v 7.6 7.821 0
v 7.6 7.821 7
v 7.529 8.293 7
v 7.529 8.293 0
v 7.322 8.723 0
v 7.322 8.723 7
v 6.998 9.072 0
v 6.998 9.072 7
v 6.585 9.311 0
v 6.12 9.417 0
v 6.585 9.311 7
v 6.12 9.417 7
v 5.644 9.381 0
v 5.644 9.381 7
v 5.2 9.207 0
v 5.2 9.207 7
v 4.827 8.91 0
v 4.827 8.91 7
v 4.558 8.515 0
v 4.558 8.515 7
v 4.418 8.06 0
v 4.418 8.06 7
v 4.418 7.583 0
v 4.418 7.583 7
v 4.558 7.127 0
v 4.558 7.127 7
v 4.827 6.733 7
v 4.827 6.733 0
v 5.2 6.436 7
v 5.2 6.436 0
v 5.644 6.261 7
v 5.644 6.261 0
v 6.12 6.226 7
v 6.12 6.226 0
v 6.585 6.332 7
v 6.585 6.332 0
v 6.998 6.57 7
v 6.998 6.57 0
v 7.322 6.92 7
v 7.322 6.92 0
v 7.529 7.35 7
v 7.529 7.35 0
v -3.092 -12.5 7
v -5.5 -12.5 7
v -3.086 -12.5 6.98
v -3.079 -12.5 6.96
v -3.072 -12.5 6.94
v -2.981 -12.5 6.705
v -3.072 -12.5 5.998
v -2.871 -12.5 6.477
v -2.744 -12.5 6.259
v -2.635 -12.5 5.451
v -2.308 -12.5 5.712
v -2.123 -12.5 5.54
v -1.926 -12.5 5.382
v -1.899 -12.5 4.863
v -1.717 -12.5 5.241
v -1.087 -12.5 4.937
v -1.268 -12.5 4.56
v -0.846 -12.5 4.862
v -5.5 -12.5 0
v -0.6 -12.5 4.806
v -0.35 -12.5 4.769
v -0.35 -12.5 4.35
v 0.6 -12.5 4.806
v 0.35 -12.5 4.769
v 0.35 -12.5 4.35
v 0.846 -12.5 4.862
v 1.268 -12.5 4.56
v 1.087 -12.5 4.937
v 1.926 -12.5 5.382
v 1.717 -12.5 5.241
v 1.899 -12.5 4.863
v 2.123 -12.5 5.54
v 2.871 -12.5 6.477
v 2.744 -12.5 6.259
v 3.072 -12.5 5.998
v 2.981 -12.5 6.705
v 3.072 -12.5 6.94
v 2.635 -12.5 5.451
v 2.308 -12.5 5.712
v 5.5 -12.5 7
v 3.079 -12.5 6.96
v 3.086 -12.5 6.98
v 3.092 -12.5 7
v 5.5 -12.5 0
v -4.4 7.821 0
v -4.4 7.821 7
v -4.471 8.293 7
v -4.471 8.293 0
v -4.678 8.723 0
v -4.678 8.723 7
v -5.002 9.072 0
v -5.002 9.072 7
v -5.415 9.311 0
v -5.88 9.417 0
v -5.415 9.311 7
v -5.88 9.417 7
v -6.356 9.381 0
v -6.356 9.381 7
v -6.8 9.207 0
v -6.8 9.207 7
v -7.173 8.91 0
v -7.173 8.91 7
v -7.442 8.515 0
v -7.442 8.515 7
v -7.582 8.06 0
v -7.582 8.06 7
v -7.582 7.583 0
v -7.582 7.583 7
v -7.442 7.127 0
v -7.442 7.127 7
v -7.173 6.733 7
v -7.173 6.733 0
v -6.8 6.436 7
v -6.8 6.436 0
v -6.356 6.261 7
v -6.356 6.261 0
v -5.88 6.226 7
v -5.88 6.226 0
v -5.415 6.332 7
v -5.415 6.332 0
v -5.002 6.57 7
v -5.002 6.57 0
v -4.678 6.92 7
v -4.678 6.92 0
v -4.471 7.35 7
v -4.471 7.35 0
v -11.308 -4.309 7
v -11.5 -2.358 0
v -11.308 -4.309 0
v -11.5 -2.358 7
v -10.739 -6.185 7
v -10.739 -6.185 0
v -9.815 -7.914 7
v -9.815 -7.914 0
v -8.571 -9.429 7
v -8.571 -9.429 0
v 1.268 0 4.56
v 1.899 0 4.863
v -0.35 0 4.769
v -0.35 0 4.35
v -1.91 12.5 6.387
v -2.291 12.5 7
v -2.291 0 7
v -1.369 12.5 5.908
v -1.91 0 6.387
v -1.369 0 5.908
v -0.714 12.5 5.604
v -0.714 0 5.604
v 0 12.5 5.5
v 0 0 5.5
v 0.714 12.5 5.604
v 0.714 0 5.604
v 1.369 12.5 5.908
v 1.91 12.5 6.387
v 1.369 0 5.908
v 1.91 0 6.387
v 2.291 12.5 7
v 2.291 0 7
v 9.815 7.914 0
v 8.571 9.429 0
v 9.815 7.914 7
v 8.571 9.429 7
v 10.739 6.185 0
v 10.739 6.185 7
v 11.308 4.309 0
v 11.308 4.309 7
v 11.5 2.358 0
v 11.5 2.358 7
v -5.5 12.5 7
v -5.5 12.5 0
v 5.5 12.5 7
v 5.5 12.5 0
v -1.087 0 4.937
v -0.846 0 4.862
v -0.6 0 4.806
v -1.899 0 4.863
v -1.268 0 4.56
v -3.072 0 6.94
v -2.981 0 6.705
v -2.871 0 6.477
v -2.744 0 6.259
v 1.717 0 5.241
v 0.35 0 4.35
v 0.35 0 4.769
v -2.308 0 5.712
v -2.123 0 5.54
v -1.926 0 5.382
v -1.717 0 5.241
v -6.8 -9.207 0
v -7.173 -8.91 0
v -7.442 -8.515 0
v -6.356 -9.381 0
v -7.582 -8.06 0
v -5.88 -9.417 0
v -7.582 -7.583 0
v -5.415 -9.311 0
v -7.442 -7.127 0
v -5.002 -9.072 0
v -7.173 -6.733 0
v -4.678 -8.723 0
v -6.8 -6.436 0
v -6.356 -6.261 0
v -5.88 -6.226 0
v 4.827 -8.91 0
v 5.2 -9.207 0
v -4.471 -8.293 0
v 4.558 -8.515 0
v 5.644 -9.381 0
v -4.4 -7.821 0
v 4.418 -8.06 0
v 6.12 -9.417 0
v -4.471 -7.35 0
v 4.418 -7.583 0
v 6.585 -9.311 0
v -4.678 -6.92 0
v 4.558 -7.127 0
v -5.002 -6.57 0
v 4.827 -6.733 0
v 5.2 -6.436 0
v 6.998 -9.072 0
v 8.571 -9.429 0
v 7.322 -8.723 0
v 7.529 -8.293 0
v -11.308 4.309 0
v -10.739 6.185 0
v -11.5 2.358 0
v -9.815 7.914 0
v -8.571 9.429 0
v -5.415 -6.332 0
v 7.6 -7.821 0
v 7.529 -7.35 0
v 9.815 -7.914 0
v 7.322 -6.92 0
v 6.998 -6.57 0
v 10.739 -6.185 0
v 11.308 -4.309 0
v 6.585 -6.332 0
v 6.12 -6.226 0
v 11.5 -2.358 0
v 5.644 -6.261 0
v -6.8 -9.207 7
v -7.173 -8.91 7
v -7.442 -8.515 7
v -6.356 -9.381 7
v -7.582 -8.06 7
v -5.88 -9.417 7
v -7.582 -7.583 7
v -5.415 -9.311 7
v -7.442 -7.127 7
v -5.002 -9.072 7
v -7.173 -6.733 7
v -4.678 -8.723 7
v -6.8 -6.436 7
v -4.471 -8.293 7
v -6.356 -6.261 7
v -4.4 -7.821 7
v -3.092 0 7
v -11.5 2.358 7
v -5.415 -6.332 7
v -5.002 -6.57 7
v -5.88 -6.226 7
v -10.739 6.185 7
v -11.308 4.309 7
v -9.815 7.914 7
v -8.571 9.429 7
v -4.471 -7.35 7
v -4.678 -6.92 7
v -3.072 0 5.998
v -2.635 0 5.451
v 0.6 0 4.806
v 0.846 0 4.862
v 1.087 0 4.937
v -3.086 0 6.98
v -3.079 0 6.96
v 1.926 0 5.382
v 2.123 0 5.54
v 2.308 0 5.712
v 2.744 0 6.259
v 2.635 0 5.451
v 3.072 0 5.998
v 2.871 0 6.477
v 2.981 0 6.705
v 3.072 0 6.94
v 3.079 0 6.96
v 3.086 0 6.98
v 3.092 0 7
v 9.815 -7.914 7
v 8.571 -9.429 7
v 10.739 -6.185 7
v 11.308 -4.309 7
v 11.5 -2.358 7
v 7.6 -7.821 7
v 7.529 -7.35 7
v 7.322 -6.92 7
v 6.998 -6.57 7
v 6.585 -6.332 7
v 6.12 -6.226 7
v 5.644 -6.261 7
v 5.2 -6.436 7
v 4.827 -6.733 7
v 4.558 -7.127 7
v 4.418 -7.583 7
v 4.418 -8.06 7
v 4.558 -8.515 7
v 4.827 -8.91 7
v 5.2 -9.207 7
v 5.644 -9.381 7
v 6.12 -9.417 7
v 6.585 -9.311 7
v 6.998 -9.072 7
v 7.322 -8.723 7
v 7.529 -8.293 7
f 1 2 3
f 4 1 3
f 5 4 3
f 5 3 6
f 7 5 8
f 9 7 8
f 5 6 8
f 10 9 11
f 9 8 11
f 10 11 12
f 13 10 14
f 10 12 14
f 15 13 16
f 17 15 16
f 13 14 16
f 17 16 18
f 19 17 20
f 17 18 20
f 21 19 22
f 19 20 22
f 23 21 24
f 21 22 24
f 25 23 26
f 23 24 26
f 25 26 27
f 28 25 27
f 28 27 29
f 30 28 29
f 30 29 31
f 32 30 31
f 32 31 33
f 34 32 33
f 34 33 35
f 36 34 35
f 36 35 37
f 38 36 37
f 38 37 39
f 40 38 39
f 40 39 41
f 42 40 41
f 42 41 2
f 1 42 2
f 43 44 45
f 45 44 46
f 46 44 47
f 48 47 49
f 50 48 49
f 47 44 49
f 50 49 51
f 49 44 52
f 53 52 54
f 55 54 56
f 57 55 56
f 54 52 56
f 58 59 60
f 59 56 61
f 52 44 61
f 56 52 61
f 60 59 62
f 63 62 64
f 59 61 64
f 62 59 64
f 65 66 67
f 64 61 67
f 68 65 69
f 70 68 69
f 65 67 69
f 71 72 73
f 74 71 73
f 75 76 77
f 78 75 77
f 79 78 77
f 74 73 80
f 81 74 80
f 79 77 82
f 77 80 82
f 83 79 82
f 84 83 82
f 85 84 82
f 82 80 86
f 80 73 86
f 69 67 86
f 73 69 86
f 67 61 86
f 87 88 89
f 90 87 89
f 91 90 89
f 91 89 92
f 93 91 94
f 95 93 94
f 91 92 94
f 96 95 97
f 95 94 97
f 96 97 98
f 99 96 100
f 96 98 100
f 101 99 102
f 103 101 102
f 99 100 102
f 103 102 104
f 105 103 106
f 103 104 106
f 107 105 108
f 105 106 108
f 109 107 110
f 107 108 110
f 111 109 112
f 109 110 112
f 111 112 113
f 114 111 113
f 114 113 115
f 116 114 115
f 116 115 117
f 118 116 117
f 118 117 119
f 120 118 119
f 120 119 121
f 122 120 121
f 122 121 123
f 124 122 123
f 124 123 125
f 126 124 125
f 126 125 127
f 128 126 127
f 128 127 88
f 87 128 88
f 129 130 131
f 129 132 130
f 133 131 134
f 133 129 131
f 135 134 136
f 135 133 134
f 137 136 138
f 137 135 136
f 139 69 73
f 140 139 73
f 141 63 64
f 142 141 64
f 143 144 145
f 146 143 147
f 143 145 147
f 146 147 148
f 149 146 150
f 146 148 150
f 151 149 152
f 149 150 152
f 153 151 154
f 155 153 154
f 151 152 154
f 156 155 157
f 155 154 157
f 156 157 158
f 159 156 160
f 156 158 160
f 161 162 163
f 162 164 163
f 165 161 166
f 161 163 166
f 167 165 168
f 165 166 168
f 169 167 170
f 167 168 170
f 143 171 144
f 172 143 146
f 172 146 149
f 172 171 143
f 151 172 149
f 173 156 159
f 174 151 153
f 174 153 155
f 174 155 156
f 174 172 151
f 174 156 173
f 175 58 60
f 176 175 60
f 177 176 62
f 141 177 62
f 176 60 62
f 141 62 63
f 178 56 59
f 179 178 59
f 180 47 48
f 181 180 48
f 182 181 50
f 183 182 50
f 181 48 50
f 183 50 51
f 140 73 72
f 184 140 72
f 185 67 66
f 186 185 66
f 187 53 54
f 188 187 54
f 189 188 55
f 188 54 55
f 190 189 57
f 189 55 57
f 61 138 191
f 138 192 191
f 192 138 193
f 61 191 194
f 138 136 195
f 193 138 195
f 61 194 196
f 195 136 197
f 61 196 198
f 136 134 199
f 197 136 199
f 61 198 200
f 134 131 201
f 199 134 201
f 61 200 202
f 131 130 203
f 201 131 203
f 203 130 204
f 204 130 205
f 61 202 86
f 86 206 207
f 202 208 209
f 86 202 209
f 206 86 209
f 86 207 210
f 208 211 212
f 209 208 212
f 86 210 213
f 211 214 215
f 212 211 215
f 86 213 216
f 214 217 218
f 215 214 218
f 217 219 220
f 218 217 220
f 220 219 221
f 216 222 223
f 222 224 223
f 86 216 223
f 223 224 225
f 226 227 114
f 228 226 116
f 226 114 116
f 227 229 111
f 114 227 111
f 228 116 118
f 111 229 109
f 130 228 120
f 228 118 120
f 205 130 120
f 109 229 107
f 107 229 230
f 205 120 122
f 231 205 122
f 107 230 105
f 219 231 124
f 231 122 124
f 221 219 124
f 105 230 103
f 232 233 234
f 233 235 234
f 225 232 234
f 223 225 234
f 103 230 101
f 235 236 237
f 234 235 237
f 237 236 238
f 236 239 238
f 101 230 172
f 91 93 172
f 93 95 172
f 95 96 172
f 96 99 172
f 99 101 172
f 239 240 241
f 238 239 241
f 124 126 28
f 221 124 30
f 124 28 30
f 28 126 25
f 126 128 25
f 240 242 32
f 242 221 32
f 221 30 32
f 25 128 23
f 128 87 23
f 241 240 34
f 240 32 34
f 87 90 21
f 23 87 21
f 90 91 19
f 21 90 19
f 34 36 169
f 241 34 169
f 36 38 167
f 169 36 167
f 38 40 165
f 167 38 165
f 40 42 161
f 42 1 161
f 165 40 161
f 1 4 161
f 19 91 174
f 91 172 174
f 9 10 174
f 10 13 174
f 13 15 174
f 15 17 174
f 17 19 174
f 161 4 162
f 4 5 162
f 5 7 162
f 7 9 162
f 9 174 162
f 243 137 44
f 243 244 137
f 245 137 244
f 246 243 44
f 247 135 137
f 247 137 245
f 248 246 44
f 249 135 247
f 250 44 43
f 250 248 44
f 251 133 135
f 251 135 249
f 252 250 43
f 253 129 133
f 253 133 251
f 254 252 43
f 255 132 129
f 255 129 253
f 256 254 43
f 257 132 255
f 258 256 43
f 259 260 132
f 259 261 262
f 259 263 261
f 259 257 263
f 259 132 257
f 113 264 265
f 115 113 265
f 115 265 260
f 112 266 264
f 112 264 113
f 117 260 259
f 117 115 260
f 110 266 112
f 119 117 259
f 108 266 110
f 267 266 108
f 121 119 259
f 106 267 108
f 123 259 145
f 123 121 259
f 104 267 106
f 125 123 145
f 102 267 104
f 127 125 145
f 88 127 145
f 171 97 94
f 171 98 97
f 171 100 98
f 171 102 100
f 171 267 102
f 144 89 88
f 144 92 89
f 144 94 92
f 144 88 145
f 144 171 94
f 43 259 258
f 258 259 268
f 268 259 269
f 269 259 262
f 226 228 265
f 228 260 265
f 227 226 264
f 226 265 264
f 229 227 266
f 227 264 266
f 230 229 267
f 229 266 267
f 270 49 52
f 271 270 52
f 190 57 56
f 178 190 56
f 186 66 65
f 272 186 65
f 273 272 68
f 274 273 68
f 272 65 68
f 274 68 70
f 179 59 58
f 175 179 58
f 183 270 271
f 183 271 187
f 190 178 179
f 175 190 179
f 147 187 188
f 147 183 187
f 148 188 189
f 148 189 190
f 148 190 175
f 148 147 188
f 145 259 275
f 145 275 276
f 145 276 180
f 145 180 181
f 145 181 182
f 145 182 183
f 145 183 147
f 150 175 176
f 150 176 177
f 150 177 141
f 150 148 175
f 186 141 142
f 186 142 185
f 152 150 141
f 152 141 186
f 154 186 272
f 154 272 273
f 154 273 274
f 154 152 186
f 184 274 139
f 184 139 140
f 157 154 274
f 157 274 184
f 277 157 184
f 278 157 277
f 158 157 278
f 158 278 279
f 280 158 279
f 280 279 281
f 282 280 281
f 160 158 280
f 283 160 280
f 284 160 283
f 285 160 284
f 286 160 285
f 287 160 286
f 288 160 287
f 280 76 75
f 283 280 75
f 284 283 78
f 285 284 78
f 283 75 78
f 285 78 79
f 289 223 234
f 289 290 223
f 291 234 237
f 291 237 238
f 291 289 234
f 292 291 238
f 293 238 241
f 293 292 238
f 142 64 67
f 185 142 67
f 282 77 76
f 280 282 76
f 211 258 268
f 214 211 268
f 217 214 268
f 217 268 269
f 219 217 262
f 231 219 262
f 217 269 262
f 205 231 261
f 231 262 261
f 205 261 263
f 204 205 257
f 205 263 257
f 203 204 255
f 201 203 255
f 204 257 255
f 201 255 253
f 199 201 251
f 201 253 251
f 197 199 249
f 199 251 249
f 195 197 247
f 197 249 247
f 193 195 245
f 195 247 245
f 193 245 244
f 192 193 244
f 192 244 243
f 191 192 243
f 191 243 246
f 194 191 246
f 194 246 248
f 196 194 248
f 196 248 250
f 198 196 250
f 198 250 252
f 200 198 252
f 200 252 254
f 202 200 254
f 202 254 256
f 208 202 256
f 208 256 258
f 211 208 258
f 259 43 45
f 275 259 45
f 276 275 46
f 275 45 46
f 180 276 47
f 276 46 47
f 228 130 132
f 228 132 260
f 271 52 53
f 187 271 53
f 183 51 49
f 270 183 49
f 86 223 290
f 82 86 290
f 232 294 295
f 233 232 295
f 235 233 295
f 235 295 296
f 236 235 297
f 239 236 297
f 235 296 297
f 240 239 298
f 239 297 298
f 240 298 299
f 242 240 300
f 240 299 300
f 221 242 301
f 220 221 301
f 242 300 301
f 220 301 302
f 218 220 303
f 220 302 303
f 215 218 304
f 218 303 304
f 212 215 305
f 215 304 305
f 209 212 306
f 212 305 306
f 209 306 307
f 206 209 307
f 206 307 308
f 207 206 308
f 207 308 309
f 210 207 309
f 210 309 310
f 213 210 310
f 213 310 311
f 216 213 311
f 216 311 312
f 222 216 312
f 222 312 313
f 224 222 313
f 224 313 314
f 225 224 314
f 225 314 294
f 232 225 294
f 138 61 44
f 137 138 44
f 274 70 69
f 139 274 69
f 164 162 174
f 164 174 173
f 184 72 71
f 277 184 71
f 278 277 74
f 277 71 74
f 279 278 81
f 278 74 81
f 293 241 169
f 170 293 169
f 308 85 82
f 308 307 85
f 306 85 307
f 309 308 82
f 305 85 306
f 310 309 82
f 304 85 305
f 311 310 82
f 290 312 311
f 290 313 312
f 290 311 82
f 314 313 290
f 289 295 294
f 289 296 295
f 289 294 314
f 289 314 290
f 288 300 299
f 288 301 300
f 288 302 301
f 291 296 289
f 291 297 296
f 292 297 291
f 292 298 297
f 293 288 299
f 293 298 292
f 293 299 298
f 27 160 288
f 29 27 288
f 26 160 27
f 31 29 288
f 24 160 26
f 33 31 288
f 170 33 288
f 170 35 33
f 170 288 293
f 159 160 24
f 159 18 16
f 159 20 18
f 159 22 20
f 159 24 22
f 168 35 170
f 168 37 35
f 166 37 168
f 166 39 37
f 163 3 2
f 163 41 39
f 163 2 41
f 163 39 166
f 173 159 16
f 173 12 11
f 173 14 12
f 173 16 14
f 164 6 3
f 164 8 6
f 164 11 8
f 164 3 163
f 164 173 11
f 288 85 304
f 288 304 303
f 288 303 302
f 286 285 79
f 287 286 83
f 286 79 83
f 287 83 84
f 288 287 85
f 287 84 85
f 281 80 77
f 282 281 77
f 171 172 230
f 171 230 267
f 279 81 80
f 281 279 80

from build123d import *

# Parameters (mm, degrees)
F0_W     = 23
F0_H     = 25
F1_DEPTH = 7
F3_DEPTH = 25.001
F4_DEPTH = 12.5
F5_SIZE  = 6
F6_R     = 10
F7_R     = 1.6
F8_DEPTH = 25


with BuildPart() as f1:
    # F0 (on Top) → F1 (new body)
    with BuildSketch(Plane.XY):
        Rectangle(F0_W, F0_H)
    extrude(amount=F1_DEPTH)

    # F2 (on face) → F3 (cut, through all)
    with BuildSketch(Plane.XZ.offset(12.5)):
        with BuildLine():
            Line((0, 7), (-2.2912878475, 7))
            ThreePointArc((-2.2912878475, 7), (0, 5.5), (2.2912878475, 7))
            Line((2.2912878475, 7), (0, 7))
        make_face()
    extrude(amount=-F3_DEPTH, mode=Mode.SUBTRACT)

    # F2 (on face) → F4 (cut)
    with BuildSketch(Plane.XZ.offset(12.5)):
        with BuildLine():
            ThreePointArc((2.2912878475, 7), (0, 5.5), (-2.2912878475, 7))
            Line((-2.2912878475, 7), (-2.8084005449, 7))
            Line((-2.8084005449, 7), (-3.0722061624, 6.9397880893))
            ThreePointArc((-3.0722061624, 6.9397880893), (-2.9281488207, 6.5898778479), (-2.7443962613, 6.2590838157))
            Line((-2.7443962613, 6.2590838157), (-2.4464411557, 6.4966950836))
            Line((-2.4464411557, 6.4966950836), (-2.0099982944, 5.9494130458))
            Line((-2.0099982944, 5.9494130458), (-2.3079534, 5.711801778))
            ThreePointArc((-2.3079534, 5.711801778), (-2.026341856, 5.459047682), (-1.7172603691, 5.2407398048))
            Line((-1.7172603691, 5.2407398048), (-1.5519077603, 5.5840980352))
            Line((-1.5519077603, 5.5840980352), (-0.9212295527, 5.2803794178))
            Line((-0.9212295527, 5.2803794178), (-1.0865821616, 4.9370211875))
            ThreePointArc((-1.0865821616, 4.9370211875), (-0.7231930354, 4.8314842854), (-0.35, 4.7689011157))
            Line((-0.35, 4.7689011157), (-0.35, 5.15))
            Line((-0.35, 5.15), (0.35, 5.15))
            Line((0.35, 5.15), (0.35, 4.7689011157))
            ThreePointArc((0.35, 4.7689011157), (0.7231930354, 4.8314842854), (1.0865821616, 4.9370211875))
            Line((1.0865821616, 4.9370211875), (0.9212295527, 5.2803794178))
            Line((0.9212295527, 5.2803794178), (1.5519077603, 5.5840980352))
            Line((1.5519077603, 5.5840980352), (1.7172603691, 5.2407398048))
            ThreePointArc((1.7172603691, 5.2407398048), (2.026341856, 5.459047682), (2.3079534, 5.711801778))
            Line((2.3079534, 5.711801778), (2.0099982944, 5.9494130458))
            Line((2.0099982944, 5.9494130458), (2.4464411557, 6.4966950836))
            Line((2.4464411557, 6.4966950836), (2.7443962613, 6.2590838157))
            ThreePointArc((2.7443962613, 6.2590838157), (2.9281488207, 6.5898778479), (3.0722061624, 6.9397880893))
            Line((3.0722061624, 6.9397880893), (2.8084005449, 7))
            Line((2.8084005449, 7), (2.2912878475, 7))
        make_face()
        with BuildLine():
            Line((3.0719063417, 5.9979032421), (2.7443962613, 6.2590838157))
            ThreePointArc((2.7443962613, 6.2590838157), (2.540952318, 5.973658144), (2.3079534, 5.711801778))
            Line((2.3079534, 5.711801778), (2.6354634804, 5.4506212044))
            Line((2.6354634804, 5.4506212044), (3.0719063417, 5.9979032421))
        make_face()
        with BuildLine():
            ThreePointArc((2.3079534, 5.711801778), (2.540952318, 5.973658144), (2.7443962613, 6.2590838157))
            Line((2.7443962613, 6.2590838157), (2.4464411557, 6.4966950836))
            Line((2.4464411557, 6.4966950836), (2.0099982944, 5.9494130458))
            Line((2.0099982944, 5.9494130458), (2.3079534, 5.711801778))
        make_face()
        with BuildLine():
            Line((1.8990147515, 4.8633229408), (1.7172603691, 5.2407398048))
            ThreePointArc((1.7172603691, 5.2407398048), (1.4101221521, 5.0718511793), (1.0865821616, 4.9370211875))
            Line((1.0865821616, 4.9370211875), (1.268336544, 4.5596043235))
            Line((1.268336544, 4.5596043235), (1.8990147515, 4.8633229408))
        make_face()
        with BuildLine():
            ThreePointArc((1.0865821616, 4.9370211875), (1.4101221521, 5.0718511793), (1.7172603691, 5.2407398048))
            Line((1.7172603691, 5.2407398048), (1.5519077603, 5.5840980352))
            Line((1.5519077603, 5.5840980352), (0.9212295527, 5.2803794178))
            Line((0.9212295527, 5.2803794178), (1.0865821616, 4.9370211875))
        make_face()
        with BuildLine():
            ThreePointArc((0.35, 4.7689011157), (0, 4.75), (-0.35, 4.7689011157))
            Line((-0.35, 4.7689011157), (-0.35, 4.35))
            Line((-0.35, 4.35), (0.35, 4.35))
            Line((0.35, 4.35), (0.35, 4.7689011157))
        make_face()
        with BuildLine():
            Line((-0.35, 5.15), (-0.35, 4.7689011157))
            ThreePointArc((-0.35, 4.7689011157), (0, 4.75), (0.35, 4.7689011157))
            Line((0.35, 4.7689011157), (0.35, 5.15))
            Line((0.35, 5.15), (-0.35, 5.15))
        make_face()
        with BuildLine():
            ThreePointArc((-1.0865821616, 4.9370211875), (-1.4101221521, 5.0718511793), (-1.7172603691, 5.2407398048))
            Line((-1.7172603691, 5.2407398048), (-1.8990147515, 4.8633229408))
            Line((-1.8990147515, 4.8633229408), (-1.268336544, 4.5596043235))
            Line((-1.268336544, 4.5596043235), (-1.0865821616, 4.9370211875))
        make_face()
        with BuildLine():
            Line((-1.5519077603, 5.5840980352), (-1.7172603691, 5.2407398048))
            ThreePointArc((-1.7172603691, 5.2407398048), (-1.4101221521, 5.0718511793), (-1.0865821616, 4.9370211875))
            Line((-1.0865821616, 4.9370211875), (-0.9212295527, 5.2803794178))
            Line((-0.9212295527, 5.2803794178), (-1.5519077603, 5.5840980352))
        make_face()
        with BuildLine():
            ThreePointArc((-2.3079534, 5.711801778), (-2.540952318, 5.973658144), (-2.7443962613, 6.2590838157))
            Line((-2.7443962613, 6.2590838157), (-3.0719063417, 5.9979032421))
            Line((-3.0719063417, 5.9979032421), (-2.6354634804, 5.4506212044))
            Line((-2.6354634804, 5.4506212044), (-2.3079534, 5.711801778))
        make_face()
        with BuildLine():
            Line((-2.4464411557, 6.4966950836), (-2.7443962613, 6.2590838157))
            ThreePointArc((-2.7443962613, 6.2590838157), (-2.540952318, 5.973658144), (-2.3079534, 5.711801778))
            Line((-2.3079534, 5.711801778), (-2.0099982944, 5.9494130458))
            Line((-2.0099982944, 5.9494130458), (-2.4464411557, 6.4966950836))
        make_face()
        with BuildLine():
            Line((3.0923292192, 7), (2.8084005449, 7))
            Line((2.8084005449, 7), (3.0722061624, 6.9397880893))
            ThreePointArc((3.0722061624, 6.9397880893), (3.0824147168, 6.969844908), (3.0923292192, 7))
        make_face()
        with BuildLine():
            Line((-3.0722061624, 6.9397880893), (-2.8084005449, 7))
            Line((-2.8084005449, 7), (-3.0923292192, 7))
            ThreePointArc((-3.0923292192, 7), (-3.0824147168, 6.969844908), (-3.0722061624, 6.9397880893))
        make_face()
    extrude(amount=-F4_DEPTH, mode=Mode.SUBTRACT)

    # F5
    f5_edges = [f1.edges().sort_by_distance(p)[0] for p in [
        (11.5, -12.5, 3.5),
        (-11.5, -12.5, 3.5),
        (11.5, 12.5, 3.5),
        (-11.5, 12.5, 3.5),
    ]]
    chamfer(f5_edges, length=F5_SIZE)

    # F6
    f6_edges = [f1.edges().sort_by_distance(p)[0] for p in [
        (11.5, 6.5, 3.5),
        (11.5, -6.5, 3.5),
        (-11.5, 6.5, 3.5),
        (-11.5, -6.5, 3.5),
    ]]
    fillet(f6_edges, radius=F6_R)

    # F7 (on face) → F8 (cut)
    with BuildSketch(Plane.XY.offset(7)):
        with Locations((6, -7.8212832158)):
            Circle(F7_R)
        with Locations((-6, -7.8212832158)):
            Circle(F7_R)
        with Locations((-6, 7.8212832158)):
            Circle(F7_R)
        with Locations((6, 7.8212832158)):
            Circle(F7_R)
    extrude(amount=-F8_DEPTH, mode=Mode.SUBTRACT)


solid = f1.part
